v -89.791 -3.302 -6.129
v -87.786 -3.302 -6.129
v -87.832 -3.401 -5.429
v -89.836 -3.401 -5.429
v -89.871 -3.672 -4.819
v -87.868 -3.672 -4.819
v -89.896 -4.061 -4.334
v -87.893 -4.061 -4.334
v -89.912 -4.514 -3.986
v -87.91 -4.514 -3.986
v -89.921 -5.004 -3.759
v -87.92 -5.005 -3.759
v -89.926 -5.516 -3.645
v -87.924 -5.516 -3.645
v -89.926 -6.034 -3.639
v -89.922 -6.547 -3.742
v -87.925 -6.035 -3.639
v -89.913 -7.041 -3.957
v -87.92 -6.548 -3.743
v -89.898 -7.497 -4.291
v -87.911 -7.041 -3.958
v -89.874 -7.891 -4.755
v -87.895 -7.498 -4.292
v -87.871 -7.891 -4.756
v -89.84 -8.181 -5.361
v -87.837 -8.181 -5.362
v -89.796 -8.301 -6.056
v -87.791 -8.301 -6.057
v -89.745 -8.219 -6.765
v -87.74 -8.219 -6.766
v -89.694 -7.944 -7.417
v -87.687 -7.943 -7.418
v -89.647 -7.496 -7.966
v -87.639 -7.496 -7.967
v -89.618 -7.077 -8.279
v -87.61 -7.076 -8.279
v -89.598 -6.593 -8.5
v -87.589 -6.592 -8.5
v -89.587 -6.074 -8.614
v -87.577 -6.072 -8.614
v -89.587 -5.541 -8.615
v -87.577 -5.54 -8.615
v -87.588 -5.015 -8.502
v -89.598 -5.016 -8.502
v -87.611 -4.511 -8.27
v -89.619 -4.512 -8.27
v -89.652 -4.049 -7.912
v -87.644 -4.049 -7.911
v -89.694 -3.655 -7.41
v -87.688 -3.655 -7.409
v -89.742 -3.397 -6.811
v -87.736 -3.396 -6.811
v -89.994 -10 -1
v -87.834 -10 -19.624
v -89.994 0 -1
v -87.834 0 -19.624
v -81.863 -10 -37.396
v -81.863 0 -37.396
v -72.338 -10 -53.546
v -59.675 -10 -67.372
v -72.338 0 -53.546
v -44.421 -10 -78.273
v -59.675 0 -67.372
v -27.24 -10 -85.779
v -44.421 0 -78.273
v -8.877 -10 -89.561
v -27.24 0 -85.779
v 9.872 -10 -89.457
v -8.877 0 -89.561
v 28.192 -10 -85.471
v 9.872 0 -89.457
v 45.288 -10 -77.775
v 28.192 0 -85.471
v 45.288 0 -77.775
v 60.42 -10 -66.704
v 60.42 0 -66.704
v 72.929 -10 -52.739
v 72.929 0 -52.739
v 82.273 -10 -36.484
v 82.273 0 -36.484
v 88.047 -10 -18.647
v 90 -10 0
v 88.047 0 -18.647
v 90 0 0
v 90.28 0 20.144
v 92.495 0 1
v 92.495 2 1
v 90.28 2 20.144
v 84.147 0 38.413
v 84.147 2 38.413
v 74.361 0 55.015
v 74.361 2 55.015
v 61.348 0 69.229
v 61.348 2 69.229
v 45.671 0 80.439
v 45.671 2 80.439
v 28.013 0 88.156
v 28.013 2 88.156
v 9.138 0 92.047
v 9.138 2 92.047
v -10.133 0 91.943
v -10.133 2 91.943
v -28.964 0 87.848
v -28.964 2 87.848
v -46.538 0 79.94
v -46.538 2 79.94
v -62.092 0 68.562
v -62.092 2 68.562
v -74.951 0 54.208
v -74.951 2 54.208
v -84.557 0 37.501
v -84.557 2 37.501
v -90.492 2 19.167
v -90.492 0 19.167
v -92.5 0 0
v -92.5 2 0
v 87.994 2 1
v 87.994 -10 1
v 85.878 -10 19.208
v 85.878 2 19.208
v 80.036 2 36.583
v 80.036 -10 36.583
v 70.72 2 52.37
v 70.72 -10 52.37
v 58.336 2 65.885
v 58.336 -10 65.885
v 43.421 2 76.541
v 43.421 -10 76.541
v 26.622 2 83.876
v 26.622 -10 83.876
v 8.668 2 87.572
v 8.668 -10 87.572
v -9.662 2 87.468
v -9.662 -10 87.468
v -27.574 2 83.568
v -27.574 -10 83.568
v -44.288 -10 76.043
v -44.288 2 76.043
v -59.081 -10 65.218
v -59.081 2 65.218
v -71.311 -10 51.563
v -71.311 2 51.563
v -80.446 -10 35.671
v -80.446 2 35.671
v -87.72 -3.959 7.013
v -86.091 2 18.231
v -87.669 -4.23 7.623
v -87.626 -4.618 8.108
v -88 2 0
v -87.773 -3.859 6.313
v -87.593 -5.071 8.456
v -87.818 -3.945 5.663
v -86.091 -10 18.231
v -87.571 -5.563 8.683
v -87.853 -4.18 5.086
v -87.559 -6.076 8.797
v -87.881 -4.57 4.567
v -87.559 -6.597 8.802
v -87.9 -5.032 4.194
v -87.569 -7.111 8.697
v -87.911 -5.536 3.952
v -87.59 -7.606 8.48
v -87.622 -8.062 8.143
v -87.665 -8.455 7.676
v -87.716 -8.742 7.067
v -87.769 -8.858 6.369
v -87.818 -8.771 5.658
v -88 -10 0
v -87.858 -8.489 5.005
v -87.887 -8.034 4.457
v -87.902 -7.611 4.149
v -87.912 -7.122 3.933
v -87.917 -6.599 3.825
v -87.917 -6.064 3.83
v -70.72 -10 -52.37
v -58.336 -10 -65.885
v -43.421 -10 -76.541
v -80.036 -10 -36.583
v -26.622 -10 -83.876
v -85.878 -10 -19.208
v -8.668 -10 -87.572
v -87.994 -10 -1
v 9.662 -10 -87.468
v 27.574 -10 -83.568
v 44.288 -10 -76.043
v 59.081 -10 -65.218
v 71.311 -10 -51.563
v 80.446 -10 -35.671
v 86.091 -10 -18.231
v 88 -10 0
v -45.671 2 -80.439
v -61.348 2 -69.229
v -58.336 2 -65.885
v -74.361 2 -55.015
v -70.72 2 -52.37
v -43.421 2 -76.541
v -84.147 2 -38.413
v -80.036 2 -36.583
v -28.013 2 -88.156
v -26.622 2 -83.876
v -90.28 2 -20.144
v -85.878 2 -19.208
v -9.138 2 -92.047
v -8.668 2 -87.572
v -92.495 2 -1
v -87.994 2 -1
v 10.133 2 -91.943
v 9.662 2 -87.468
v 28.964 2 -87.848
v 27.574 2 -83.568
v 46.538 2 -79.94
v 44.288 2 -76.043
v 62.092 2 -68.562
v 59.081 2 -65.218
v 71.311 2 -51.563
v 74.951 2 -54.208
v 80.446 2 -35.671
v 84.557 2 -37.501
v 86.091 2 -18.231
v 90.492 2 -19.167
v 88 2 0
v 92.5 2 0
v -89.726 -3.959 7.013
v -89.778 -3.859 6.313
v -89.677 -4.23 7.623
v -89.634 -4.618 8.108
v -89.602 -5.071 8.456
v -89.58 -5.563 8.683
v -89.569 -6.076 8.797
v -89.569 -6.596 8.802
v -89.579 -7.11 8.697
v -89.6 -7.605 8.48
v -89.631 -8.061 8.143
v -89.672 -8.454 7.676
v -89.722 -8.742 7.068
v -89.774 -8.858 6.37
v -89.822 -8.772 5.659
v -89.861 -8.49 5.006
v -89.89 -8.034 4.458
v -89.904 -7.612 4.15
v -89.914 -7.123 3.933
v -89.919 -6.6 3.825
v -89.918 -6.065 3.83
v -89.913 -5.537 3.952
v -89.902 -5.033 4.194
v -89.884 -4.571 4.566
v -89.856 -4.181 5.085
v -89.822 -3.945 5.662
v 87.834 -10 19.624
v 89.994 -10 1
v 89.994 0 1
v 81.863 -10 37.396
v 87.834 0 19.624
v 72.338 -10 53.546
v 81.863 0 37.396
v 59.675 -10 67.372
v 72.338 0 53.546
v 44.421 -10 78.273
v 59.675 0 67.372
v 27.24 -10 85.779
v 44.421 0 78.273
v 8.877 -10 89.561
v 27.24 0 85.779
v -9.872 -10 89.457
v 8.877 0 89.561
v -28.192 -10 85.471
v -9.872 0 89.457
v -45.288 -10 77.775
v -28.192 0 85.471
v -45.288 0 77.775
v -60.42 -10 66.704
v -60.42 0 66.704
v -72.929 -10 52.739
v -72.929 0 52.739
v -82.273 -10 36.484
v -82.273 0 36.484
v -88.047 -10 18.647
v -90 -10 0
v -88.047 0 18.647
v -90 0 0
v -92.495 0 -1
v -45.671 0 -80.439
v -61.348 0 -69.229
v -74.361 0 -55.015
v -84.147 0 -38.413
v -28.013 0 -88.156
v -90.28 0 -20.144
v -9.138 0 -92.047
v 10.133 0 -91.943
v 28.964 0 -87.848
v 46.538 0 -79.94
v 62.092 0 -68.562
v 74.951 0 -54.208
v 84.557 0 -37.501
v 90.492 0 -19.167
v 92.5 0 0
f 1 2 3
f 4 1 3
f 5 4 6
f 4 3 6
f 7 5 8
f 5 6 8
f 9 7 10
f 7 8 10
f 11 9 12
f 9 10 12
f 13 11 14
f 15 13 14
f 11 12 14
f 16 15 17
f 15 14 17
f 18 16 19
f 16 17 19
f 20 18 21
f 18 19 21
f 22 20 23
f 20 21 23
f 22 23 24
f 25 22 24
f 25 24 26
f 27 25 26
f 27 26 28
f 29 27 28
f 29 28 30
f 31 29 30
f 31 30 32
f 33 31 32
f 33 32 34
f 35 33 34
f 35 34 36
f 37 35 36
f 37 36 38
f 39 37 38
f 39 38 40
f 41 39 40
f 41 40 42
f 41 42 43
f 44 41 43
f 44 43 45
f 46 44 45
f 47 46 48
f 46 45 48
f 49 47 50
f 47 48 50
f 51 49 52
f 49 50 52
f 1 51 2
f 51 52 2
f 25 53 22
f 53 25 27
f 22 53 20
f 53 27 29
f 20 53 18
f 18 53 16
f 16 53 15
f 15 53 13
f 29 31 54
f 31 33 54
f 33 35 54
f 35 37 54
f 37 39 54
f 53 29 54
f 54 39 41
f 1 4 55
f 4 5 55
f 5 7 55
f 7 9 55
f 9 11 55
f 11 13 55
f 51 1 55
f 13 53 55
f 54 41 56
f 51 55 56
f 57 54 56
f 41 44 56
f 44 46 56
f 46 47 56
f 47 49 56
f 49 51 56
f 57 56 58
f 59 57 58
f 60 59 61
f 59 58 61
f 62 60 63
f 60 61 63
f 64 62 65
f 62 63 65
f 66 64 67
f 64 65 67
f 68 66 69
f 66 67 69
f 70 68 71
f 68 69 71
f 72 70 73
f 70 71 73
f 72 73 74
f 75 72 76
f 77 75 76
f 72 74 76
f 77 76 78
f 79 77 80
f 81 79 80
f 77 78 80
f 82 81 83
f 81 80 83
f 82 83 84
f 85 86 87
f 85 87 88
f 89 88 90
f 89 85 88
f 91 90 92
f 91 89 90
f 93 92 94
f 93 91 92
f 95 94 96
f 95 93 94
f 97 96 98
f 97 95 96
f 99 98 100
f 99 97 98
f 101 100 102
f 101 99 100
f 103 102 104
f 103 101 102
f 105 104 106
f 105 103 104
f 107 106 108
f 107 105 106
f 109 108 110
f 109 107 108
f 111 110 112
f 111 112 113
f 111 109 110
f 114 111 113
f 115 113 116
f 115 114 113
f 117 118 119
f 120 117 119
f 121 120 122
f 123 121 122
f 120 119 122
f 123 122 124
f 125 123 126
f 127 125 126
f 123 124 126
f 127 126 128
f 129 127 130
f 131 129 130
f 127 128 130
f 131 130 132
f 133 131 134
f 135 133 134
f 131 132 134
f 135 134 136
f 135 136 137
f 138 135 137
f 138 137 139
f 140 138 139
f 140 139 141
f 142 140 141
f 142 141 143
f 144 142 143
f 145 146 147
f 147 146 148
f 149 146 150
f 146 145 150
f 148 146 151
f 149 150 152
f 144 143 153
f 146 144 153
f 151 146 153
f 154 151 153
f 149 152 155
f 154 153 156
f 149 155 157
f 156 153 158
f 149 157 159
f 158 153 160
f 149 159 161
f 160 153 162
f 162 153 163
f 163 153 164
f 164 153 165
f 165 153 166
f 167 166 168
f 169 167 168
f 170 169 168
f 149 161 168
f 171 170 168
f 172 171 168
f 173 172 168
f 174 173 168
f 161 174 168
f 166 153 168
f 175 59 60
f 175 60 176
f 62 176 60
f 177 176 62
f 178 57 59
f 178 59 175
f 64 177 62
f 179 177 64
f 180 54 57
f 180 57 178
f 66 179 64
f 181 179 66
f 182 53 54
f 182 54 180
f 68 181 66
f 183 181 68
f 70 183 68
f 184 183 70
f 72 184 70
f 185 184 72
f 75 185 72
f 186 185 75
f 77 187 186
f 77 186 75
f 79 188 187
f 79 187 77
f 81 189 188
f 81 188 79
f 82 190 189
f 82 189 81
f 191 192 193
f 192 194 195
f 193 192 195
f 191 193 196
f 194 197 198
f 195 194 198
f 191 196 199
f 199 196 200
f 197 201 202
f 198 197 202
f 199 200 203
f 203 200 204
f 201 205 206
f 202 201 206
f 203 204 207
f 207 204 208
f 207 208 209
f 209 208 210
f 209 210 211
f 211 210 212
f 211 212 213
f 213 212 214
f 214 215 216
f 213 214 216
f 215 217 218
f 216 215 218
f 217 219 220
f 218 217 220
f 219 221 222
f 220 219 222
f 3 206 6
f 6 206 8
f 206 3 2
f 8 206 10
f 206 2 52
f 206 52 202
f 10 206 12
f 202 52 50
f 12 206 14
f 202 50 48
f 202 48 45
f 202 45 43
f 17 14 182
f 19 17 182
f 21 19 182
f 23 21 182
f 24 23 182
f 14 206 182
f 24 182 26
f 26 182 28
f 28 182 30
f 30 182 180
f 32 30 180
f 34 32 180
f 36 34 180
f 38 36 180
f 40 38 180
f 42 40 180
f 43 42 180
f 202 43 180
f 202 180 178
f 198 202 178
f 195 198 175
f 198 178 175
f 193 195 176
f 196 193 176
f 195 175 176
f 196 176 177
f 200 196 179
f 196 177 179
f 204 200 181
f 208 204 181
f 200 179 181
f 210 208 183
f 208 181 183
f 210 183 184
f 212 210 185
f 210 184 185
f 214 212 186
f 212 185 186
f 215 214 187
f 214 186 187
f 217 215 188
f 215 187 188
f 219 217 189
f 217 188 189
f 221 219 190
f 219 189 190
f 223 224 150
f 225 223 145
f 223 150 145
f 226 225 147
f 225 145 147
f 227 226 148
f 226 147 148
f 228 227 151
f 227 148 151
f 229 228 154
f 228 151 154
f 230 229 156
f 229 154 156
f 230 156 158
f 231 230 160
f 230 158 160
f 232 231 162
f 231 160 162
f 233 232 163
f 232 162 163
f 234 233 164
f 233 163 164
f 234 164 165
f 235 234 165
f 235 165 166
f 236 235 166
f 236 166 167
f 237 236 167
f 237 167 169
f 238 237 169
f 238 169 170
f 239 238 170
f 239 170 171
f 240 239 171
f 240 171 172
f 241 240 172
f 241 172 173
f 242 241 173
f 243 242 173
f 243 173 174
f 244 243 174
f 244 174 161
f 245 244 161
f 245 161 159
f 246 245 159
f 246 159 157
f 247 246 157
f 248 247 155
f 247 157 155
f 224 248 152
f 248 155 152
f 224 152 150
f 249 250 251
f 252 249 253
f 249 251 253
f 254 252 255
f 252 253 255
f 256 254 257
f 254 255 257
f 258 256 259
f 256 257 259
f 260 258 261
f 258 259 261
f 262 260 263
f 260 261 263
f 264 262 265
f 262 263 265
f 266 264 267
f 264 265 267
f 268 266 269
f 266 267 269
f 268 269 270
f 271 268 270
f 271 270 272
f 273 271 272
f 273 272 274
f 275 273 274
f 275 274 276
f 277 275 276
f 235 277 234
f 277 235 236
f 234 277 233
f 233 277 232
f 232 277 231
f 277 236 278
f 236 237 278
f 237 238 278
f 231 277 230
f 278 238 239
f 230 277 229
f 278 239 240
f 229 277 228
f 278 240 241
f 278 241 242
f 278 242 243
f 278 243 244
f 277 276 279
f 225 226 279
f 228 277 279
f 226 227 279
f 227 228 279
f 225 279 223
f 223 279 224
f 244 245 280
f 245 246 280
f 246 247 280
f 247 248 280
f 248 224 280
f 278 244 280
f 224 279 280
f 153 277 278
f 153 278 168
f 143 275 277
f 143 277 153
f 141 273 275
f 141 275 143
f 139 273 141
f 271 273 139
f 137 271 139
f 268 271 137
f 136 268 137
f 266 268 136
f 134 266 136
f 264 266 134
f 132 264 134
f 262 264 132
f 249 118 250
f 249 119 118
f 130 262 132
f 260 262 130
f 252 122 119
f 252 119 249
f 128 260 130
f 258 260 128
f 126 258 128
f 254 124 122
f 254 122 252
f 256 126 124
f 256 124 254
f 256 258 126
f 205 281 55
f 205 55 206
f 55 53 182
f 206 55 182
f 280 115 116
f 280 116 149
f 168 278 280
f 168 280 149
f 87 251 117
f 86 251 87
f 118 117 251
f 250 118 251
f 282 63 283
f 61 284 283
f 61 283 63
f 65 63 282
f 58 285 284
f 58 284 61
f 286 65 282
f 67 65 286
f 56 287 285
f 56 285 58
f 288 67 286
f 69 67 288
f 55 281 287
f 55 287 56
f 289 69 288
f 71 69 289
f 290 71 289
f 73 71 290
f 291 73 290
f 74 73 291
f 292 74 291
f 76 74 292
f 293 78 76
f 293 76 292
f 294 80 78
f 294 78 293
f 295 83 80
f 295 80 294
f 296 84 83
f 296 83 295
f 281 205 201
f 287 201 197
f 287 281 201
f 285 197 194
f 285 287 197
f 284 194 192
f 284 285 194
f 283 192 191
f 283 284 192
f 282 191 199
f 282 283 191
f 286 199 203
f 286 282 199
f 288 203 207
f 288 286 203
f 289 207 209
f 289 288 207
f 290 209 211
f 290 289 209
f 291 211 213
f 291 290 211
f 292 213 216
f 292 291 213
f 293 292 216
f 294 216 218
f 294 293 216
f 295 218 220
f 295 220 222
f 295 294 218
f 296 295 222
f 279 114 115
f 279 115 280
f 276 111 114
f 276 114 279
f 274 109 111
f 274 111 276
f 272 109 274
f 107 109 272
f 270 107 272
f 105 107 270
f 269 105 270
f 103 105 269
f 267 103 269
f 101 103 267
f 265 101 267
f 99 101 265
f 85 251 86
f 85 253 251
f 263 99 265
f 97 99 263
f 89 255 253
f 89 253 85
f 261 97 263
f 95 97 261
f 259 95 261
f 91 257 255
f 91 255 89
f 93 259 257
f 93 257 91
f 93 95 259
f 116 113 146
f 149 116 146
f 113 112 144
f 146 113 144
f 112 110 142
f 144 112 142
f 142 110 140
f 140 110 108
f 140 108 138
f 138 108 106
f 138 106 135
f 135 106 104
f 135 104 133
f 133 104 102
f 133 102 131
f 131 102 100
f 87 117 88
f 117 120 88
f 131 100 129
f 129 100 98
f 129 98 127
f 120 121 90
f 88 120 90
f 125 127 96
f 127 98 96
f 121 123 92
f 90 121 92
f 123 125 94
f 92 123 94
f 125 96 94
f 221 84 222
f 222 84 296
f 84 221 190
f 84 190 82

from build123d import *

# Parameters (mm, degrees)
F0_R     = 90
F0_R_2   = 88
F1_DEPTH = 10
F2_R     = 92.5
F2_R_2   = 88
F3_DEPTH = 2
F6_D     = 5
F6_DEPTH = 92.501
F4_W     = 24.3931487203
F4_H     = 1
F4_W_2   = 16.3366869092
F7_DEPTH = 25
F8_DEPTH = 25


with BuildPart() as f1:
    # F0 (on Front) → F1 (new body)
    with BuildSketch(Plane.XZ):
        Circle(F0_R)
        Circle(F0_R_2, mode=Mode.SUBTRACT)
    extrude(amount=F1_DEPTH)

    # F2 (on Front) → F3 (join)
    with BuildSketch(Plane.XZ):
        Circle(F2_R)
        Circle(F2_R_2, mode=Mode.SUBTRACT)
    extrude(amount=-F3_DEPTH)

    # F6 (through all, one way)
    with BuildSketch(Plane.YZ):
        with Locations((-6.3586533647, 6.312994866), (-5.8015659534, -6.1285826857)):
            Circle(F6_D / 2)
    extrude(amount=-F6_DEPTH, mode=Mode.SUBTRACT)

    # F4 (on Front) → F7 (cut)
    with BuildSketch(Plane.XZ):
        with Locations((91.9778235257, 0.5)):
            Rectangle(F4_W, F4_H)
        with Locations((-90.5292220414, -0.5)):
            Rectangle(F4_W_2, F4_H)
    extrude(amount=F7_DEPTH, mode=Mode.SUBTRACT)

    # F4 (on Front) → F8 (cut)
    with BuildSketch(Plane.XZ):
        with Locations((91.9778235257, 0.5)):
            Rectangle(F4_W, F4_H)
        with Locations((-90.5292220414, -0.5)):
            Rectangle(F4_W_2, F4_H)
    extrude(amount=-F8_DEPTH, mode=Mode.SUBTRACT)


solid = f1.part
